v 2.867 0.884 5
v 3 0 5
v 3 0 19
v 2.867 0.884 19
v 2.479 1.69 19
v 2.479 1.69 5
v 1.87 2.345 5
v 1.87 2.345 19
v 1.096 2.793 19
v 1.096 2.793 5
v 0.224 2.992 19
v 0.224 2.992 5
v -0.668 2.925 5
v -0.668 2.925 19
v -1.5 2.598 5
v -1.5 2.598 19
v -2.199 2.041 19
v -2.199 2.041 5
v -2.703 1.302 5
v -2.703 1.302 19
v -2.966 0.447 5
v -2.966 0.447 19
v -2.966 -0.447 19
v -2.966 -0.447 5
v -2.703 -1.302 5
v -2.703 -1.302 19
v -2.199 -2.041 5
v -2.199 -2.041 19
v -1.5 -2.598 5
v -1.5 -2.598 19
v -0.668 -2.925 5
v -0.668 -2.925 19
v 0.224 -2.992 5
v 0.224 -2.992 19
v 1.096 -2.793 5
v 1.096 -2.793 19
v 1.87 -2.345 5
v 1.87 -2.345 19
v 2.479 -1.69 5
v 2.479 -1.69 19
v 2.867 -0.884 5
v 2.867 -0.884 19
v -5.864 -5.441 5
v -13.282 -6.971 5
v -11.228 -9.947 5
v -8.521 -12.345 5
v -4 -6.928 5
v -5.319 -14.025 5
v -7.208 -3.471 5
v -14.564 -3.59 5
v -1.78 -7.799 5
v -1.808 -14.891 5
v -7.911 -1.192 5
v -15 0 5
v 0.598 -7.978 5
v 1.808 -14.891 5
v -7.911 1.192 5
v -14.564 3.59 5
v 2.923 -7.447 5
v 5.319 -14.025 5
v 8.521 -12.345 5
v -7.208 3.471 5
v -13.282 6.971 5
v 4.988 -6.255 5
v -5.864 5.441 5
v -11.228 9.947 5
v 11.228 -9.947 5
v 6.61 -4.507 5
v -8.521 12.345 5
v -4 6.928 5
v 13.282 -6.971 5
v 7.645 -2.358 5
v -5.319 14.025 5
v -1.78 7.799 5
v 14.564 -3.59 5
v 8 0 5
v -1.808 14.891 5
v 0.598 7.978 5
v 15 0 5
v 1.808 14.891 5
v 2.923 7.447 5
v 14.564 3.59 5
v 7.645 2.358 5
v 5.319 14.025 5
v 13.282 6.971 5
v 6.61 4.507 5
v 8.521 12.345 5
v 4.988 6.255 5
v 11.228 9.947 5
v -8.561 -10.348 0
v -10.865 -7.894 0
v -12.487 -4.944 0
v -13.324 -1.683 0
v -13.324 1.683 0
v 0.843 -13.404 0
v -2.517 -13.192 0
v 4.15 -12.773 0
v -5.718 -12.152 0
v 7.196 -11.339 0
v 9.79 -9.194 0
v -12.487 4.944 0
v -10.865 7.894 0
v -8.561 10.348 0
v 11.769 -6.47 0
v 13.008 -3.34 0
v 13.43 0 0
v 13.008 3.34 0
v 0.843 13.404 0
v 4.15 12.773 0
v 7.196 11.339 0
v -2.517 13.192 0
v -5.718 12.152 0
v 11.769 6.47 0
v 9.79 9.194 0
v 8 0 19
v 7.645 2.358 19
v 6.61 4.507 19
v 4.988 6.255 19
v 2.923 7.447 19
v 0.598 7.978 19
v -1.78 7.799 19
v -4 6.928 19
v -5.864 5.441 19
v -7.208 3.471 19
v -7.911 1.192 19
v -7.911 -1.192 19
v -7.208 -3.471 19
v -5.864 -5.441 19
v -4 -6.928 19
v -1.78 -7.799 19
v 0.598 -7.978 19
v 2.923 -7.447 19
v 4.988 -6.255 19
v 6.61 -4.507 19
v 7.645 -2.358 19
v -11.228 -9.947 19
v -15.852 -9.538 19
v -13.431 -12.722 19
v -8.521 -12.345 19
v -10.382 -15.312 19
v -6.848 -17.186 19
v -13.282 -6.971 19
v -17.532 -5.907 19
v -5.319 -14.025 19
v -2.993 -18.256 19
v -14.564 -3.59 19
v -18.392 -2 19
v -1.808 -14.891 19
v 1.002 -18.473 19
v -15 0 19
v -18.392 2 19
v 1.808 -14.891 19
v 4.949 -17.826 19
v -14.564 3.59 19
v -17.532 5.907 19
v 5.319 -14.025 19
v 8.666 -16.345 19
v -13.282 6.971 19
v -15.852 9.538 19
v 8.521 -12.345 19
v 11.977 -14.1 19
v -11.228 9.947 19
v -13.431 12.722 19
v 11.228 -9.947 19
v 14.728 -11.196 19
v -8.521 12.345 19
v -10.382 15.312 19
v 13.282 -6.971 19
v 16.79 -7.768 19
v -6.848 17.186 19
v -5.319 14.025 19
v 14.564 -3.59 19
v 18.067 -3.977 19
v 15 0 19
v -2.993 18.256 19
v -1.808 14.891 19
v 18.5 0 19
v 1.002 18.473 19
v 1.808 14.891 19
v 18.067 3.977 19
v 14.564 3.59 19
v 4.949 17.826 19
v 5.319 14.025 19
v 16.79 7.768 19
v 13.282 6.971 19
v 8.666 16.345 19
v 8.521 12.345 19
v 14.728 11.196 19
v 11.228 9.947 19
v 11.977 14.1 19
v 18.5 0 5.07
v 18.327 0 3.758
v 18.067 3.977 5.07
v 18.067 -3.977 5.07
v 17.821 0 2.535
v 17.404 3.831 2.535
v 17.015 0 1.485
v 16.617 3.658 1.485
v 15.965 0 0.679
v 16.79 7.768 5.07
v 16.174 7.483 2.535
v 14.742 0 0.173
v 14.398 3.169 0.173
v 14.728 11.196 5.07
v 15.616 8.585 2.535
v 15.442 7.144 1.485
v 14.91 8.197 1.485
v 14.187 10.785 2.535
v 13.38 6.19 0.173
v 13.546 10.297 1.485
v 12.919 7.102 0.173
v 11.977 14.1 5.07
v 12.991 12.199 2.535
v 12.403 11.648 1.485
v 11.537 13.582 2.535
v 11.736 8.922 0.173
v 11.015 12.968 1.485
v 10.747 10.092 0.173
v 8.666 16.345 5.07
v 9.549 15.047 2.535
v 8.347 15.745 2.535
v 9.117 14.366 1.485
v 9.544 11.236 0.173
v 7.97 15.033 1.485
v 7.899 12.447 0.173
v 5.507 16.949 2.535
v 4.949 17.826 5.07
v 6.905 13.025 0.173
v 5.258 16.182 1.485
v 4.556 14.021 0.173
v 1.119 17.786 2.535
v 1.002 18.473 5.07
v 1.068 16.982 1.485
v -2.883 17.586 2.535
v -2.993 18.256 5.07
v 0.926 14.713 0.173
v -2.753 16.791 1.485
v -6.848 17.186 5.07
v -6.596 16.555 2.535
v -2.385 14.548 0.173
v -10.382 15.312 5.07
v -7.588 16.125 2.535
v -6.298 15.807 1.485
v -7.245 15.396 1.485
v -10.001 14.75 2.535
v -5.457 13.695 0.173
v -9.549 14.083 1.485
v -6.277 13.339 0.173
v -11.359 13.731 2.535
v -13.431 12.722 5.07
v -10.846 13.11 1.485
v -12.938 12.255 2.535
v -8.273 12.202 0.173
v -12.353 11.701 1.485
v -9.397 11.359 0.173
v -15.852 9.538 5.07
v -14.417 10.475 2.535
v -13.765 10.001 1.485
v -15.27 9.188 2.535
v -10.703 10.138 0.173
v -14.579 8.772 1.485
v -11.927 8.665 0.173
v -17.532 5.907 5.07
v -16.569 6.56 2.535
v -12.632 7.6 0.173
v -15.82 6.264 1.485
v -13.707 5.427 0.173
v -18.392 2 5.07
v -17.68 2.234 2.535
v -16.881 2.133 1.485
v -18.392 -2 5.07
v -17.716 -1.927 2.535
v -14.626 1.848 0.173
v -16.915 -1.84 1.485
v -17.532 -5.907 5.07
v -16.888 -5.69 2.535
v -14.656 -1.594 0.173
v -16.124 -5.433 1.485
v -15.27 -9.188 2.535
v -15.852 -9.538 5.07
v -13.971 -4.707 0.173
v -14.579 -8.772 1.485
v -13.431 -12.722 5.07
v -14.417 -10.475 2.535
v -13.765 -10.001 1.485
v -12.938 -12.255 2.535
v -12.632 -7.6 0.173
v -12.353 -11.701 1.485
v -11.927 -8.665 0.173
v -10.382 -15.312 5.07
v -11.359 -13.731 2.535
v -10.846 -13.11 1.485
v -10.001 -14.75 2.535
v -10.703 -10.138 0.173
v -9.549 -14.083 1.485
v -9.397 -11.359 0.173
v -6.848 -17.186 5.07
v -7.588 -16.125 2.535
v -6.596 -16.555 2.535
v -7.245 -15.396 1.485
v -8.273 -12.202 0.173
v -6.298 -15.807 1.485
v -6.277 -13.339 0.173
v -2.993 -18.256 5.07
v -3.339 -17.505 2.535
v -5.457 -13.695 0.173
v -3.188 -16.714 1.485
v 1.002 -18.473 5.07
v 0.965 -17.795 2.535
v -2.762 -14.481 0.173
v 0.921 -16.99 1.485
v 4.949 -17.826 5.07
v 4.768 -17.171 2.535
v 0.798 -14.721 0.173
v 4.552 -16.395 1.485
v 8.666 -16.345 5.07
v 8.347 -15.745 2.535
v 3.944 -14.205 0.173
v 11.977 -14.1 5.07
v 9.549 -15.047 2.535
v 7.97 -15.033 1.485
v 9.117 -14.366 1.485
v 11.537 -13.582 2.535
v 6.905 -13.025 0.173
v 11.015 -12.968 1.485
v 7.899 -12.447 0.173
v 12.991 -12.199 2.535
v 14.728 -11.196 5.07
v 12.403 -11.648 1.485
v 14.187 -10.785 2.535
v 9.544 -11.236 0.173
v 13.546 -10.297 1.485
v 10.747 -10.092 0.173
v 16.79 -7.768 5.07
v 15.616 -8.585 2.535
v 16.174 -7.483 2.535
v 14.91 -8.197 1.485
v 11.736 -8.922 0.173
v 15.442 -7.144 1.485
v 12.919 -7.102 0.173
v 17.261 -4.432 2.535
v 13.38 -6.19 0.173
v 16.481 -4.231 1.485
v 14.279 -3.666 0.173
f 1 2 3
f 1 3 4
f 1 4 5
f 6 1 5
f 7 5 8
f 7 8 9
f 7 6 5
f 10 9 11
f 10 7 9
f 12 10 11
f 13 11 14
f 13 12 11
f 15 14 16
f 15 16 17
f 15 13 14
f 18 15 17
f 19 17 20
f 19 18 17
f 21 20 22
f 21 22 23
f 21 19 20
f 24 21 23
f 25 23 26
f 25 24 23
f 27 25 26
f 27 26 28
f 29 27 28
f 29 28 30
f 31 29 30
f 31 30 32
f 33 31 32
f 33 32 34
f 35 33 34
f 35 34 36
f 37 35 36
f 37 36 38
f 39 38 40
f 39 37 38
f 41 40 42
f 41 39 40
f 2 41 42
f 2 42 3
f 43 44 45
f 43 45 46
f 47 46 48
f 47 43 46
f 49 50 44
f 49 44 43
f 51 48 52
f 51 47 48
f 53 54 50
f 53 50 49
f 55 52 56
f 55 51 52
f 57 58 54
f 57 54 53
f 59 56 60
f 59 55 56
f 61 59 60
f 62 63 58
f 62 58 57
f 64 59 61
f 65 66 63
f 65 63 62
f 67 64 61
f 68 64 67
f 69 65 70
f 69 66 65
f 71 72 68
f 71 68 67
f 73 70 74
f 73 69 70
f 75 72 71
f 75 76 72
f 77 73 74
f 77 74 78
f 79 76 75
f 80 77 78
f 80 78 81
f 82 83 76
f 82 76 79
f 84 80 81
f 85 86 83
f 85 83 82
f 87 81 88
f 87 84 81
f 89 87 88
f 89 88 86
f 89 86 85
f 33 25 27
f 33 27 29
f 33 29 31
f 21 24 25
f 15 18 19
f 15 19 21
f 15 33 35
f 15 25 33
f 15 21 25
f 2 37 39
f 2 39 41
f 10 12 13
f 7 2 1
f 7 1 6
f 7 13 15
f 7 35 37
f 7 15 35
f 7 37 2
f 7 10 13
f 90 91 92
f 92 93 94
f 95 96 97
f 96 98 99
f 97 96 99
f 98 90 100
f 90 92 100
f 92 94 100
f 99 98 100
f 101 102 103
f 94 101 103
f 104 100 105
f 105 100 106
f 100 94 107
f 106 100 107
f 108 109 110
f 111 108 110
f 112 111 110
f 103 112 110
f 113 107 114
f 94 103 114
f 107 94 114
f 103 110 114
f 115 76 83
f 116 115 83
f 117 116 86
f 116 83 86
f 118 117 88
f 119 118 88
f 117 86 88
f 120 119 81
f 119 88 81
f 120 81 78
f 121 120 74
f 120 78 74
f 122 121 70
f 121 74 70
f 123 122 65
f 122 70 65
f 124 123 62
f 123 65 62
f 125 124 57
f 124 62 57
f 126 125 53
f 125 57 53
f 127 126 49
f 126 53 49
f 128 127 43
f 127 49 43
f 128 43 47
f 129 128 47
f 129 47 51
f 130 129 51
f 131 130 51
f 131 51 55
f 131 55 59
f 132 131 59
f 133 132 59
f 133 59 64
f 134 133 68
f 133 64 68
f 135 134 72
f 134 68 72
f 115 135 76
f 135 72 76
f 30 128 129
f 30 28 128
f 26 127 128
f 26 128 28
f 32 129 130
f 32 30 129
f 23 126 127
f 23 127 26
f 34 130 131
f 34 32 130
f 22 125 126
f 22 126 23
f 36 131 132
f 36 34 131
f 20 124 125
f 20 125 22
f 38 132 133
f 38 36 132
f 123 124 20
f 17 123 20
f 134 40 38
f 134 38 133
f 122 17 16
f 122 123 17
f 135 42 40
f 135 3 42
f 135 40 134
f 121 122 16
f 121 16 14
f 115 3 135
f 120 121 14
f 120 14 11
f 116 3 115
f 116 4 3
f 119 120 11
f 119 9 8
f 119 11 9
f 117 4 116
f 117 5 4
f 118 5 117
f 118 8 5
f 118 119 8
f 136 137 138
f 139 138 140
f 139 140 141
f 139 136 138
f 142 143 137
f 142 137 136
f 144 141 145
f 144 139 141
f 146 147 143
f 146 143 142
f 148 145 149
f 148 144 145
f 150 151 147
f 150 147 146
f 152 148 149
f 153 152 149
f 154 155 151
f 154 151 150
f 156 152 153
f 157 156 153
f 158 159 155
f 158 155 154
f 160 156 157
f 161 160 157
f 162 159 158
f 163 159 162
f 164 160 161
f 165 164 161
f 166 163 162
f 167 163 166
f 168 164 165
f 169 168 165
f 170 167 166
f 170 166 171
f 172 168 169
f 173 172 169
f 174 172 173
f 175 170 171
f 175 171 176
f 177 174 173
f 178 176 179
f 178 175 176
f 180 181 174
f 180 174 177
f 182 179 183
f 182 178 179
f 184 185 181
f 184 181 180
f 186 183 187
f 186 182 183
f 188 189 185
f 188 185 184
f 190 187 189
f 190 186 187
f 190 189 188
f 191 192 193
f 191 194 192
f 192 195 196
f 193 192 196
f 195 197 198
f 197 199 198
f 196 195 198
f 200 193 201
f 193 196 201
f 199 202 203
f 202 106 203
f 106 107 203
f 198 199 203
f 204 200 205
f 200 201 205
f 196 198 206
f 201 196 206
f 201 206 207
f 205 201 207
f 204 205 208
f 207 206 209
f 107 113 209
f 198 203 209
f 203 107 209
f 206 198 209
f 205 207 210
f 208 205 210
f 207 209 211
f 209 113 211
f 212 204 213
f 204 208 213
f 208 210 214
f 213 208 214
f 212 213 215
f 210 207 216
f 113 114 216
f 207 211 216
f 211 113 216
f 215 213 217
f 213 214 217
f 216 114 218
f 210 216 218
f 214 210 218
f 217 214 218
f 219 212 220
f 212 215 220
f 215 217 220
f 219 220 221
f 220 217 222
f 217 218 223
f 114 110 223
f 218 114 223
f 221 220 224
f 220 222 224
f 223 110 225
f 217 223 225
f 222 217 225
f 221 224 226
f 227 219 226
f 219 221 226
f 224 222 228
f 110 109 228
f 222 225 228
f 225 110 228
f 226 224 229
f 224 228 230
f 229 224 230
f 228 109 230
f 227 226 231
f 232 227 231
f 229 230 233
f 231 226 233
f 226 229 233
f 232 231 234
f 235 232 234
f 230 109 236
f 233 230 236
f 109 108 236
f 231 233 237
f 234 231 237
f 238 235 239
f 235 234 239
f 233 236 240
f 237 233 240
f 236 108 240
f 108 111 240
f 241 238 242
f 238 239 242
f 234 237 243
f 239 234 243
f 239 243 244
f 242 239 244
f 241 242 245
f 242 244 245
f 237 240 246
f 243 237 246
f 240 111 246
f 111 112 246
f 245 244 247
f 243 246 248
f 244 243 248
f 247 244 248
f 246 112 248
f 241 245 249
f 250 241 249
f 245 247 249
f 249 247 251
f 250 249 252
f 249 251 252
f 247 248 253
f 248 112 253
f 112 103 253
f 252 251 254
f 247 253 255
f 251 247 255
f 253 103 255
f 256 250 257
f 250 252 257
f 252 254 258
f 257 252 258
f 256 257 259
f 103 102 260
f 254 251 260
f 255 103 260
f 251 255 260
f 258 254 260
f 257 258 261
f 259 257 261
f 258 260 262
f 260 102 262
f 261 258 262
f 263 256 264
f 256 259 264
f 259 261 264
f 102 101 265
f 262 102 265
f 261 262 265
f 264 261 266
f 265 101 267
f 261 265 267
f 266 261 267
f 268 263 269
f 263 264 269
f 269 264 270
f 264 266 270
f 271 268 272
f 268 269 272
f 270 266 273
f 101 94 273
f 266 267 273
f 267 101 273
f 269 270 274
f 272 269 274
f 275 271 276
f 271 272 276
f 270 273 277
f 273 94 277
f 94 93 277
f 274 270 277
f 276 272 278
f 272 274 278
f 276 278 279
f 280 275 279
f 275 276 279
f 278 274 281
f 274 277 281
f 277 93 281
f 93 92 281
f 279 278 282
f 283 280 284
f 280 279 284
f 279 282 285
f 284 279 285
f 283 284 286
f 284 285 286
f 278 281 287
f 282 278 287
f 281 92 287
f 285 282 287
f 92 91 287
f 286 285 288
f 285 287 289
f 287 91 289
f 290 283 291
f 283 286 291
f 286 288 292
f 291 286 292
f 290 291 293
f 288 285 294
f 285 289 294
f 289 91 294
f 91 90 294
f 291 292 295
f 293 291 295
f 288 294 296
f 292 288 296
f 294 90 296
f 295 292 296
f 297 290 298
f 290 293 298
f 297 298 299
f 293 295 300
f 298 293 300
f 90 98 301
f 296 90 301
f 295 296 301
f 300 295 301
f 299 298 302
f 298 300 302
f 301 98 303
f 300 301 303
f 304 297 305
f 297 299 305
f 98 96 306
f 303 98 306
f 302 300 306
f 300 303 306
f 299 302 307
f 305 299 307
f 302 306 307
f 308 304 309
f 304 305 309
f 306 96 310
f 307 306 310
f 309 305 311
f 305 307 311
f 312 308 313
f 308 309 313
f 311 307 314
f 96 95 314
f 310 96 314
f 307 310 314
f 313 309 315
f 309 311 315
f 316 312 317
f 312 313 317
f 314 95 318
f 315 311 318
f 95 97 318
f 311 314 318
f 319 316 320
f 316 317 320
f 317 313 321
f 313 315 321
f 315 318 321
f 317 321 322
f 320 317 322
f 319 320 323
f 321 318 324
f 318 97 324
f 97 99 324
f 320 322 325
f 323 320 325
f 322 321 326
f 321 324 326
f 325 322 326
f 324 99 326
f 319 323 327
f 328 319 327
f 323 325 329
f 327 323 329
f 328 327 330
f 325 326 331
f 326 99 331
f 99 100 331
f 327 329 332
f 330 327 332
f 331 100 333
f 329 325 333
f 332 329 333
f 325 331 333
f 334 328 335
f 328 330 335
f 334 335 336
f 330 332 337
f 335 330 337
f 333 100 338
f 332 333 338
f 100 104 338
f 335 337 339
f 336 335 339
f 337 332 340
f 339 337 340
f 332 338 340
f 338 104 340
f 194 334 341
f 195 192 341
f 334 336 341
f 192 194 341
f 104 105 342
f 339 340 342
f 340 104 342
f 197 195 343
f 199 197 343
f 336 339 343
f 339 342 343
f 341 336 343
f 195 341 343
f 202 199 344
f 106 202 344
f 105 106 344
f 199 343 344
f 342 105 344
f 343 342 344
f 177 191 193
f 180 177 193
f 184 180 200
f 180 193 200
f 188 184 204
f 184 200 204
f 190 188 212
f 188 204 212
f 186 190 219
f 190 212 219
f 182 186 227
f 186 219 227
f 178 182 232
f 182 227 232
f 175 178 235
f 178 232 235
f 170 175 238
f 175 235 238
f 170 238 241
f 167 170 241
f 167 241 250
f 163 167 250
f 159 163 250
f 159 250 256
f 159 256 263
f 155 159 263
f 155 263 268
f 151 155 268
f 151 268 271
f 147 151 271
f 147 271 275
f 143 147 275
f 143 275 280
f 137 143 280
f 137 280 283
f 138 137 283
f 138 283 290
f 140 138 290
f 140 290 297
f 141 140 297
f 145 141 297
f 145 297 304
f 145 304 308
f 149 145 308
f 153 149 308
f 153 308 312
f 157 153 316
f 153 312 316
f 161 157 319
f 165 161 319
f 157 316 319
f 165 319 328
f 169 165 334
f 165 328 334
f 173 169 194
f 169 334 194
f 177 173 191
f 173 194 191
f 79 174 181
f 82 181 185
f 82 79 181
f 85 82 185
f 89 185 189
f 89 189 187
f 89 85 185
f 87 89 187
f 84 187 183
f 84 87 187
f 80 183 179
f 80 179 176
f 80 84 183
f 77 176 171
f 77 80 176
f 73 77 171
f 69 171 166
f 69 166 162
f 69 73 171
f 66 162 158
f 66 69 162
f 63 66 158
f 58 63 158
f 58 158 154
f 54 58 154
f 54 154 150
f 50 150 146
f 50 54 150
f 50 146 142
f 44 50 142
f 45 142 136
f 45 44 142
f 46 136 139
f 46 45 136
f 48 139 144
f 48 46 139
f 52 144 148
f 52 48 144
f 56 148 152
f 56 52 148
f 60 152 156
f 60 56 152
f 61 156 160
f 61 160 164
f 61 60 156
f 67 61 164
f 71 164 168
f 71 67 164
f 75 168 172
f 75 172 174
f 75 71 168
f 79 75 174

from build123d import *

# Parameters (mm, degrees)
F0_R     = 18.5
F1_DEPTH = 5
F2_R     = 18.5
F2_R_2   = 15
F3_DEPTH = 14
F4_R     = 5.069848
F5_R     = 8
F5_R_2   = 3
F6_DEPTH = 14


with BuildPart() as f1:
    # F0 (on Top) → F1 (new body)
    with BuildSketch(Plane.XY):
        Circle(F0_R)
    extrude(amount=F1_DEPTH)

    # F2 (on face) → F3 (join)
    with BuildSketch(Plane.XY.offset(5)):
        Circle(F2_R)
        Circle(F2_R_2, mode=Mode.SUBTRACT)
    extrude(amount=F3_DEPTH)

    # F4
    f4_edges = [f1.edges().sort_by_distance(p)[0] for p in [
        (-18.5, 0, 0),
    ]]
    fillet(f4_edges, radius=F4_R)

    # F5 (on face) → F6 (join)
    with BuildSketch(Plane.XY.offset(5)):
        Circle(F5_R)
        Circle(F5_R_2, mode=Mode.SUBTRACT)
    extrude(amount=F6_DEPTH)


solid = f1.part
